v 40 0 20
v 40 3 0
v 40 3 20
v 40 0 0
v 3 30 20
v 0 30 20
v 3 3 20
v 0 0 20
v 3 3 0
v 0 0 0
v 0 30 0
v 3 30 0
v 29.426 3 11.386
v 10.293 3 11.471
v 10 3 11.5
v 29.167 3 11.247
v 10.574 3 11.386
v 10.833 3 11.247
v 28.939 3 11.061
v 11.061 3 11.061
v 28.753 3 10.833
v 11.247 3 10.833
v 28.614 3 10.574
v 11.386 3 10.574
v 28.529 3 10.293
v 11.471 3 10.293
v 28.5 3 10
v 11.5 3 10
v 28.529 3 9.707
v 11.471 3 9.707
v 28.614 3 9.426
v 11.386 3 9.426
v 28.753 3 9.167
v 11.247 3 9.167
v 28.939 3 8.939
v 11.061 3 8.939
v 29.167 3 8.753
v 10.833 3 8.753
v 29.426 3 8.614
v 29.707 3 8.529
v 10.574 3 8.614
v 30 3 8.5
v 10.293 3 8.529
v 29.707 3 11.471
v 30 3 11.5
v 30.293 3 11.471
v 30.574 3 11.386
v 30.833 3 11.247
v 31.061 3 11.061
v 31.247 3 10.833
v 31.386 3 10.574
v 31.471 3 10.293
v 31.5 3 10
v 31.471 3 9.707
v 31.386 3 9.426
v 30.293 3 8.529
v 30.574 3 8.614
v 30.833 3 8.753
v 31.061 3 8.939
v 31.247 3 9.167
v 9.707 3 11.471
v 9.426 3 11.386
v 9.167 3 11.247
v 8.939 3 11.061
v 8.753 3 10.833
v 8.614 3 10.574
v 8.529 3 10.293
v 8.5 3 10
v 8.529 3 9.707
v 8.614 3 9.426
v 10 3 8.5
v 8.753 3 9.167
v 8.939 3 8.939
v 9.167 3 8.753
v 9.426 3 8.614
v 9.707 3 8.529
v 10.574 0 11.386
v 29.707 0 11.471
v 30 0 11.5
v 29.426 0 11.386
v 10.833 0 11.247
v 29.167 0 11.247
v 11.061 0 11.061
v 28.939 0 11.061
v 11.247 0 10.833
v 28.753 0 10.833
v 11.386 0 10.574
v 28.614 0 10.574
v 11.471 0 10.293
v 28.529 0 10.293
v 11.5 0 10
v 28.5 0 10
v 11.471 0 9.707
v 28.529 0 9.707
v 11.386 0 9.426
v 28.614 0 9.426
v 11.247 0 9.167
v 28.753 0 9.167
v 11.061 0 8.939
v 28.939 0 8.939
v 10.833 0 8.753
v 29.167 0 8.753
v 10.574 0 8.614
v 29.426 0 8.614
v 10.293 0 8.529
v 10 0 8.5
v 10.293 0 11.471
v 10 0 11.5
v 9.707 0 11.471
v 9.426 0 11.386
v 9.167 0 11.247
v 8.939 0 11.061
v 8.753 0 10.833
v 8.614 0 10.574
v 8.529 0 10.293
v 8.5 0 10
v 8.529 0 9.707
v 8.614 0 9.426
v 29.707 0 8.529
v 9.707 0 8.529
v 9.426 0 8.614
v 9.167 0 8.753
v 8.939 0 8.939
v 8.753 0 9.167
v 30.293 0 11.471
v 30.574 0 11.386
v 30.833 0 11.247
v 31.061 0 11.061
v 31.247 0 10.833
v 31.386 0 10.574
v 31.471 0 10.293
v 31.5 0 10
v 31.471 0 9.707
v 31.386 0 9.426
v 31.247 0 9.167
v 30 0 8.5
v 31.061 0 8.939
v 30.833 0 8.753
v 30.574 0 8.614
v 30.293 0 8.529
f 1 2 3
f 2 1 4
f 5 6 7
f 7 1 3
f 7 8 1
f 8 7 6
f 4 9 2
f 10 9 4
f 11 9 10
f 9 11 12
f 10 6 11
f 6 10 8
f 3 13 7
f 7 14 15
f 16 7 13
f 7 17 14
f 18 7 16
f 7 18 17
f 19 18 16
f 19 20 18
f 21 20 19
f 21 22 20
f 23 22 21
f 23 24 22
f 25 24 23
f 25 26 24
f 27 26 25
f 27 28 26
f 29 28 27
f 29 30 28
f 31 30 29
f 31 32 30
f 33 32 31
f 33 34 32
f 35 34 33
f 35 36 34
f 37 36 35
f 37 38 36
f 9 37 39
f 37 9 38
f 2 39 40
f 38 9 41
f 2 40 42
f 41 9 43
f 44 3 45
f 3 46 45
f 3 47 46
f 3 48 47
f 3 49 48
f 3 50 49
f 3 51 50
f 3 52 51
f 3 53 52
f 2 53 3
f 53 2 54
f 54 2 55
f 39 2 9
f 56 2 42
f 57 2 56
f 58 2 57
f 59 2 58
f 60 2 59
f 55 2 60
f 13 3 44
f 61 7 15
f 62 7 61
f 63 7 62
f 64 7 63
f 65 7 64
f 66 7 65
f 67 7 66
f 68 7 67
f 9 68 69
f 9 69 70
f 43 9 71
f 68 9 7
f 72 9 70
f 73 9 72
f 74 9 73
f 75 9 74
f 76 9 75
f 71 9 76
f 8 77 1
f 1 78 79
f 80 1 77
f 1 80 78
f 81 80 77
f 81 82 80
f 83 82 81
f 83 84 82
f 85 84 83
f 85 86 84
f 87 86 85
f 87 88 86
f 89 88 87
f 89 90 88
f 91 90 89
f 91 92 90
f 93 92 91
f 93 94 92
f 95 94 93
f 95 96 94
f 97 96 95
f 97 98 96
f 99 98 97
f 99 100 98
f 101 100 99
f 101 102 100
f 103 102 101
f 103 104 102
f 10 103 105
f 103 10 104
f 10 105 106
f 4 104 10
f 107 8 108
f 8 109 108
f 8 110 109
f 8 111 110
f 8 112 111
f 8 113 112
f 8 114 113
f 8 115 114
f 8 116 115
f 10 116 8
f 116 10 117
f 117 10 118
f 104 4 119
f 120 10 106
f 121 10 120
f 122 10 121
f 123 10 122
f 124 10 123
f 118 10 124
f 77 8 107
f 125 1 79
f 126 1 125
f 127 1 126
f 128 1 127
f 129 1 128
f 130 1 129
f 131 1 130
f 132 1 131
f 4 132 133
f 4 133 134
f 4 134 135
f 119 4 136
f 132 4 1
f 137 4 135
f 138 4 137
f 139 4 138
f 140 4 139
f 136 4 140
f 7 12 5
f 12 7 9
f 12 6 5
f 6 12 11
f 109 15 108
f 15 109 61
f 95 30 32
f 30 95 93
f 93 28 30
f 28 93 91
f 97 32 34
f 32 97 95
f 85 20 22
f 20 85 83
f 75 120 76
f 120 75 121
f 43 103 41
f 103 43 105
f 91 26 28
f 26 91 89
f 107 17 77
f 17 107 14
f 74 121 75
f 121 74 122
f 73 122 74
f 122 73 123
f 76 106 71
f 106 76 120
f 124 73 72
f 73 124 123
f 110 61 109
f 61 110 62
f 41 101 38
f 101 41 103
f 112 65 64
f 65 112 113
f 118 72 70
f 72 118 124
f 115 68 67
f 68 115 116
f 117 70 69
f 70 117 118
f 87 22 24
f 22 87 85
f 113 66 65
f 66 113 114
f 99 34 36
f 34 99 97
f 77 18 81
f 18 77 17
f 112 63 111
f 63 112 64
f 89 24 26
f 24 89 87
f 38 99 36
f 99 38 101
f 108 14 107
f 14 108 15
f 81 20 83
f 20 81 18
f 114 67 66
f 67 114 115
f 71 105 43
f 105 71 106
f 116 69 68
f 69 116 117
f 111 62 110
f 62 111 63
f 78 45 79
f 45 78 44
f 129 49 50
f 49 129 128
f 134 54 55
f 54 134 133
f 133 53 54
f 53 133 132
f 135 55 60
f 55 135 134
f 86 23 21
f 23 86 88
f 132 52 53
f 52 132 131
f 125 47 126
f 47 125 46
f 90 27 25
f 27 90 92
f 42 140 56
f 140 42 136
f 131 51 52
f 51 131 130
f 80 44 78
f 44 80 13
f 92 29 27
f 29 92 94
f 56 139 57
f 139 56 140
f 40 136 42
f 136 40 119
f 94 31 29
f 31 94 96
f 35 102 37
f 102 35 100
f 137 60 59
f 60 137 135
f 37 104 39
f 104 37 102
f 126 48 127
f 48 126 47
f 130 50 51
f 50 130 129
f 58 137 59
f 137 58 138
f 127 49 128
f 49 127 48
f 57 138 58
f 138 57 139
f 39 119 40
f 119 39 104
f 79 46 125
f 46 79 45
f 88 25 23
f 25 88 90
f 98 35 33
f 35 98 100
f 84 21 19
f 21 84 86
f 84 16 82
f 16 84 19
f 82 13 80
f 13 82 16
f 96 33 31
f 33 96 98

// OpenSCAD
// B4 printable L-bracket. Dimensions are millimetres and validated by scad-service.
arm_a = 40;
arm_b = 30;
height = 20;
thickness = 3;
hole_spacing = 20;
hole_diameter = 3;

difference() {
  union() {
    cube([arm_a, thickness, height]);
    cube([thickness, arm_b, height]);
  }
  for (x = [10, 10 + hole_spacing]) {
    translate([x, -1, height / 2]) rotate([-90, 0, 0]) cylinder(h = thickness + 2, d = hole_diameter, $fn = 32);
  }
}
